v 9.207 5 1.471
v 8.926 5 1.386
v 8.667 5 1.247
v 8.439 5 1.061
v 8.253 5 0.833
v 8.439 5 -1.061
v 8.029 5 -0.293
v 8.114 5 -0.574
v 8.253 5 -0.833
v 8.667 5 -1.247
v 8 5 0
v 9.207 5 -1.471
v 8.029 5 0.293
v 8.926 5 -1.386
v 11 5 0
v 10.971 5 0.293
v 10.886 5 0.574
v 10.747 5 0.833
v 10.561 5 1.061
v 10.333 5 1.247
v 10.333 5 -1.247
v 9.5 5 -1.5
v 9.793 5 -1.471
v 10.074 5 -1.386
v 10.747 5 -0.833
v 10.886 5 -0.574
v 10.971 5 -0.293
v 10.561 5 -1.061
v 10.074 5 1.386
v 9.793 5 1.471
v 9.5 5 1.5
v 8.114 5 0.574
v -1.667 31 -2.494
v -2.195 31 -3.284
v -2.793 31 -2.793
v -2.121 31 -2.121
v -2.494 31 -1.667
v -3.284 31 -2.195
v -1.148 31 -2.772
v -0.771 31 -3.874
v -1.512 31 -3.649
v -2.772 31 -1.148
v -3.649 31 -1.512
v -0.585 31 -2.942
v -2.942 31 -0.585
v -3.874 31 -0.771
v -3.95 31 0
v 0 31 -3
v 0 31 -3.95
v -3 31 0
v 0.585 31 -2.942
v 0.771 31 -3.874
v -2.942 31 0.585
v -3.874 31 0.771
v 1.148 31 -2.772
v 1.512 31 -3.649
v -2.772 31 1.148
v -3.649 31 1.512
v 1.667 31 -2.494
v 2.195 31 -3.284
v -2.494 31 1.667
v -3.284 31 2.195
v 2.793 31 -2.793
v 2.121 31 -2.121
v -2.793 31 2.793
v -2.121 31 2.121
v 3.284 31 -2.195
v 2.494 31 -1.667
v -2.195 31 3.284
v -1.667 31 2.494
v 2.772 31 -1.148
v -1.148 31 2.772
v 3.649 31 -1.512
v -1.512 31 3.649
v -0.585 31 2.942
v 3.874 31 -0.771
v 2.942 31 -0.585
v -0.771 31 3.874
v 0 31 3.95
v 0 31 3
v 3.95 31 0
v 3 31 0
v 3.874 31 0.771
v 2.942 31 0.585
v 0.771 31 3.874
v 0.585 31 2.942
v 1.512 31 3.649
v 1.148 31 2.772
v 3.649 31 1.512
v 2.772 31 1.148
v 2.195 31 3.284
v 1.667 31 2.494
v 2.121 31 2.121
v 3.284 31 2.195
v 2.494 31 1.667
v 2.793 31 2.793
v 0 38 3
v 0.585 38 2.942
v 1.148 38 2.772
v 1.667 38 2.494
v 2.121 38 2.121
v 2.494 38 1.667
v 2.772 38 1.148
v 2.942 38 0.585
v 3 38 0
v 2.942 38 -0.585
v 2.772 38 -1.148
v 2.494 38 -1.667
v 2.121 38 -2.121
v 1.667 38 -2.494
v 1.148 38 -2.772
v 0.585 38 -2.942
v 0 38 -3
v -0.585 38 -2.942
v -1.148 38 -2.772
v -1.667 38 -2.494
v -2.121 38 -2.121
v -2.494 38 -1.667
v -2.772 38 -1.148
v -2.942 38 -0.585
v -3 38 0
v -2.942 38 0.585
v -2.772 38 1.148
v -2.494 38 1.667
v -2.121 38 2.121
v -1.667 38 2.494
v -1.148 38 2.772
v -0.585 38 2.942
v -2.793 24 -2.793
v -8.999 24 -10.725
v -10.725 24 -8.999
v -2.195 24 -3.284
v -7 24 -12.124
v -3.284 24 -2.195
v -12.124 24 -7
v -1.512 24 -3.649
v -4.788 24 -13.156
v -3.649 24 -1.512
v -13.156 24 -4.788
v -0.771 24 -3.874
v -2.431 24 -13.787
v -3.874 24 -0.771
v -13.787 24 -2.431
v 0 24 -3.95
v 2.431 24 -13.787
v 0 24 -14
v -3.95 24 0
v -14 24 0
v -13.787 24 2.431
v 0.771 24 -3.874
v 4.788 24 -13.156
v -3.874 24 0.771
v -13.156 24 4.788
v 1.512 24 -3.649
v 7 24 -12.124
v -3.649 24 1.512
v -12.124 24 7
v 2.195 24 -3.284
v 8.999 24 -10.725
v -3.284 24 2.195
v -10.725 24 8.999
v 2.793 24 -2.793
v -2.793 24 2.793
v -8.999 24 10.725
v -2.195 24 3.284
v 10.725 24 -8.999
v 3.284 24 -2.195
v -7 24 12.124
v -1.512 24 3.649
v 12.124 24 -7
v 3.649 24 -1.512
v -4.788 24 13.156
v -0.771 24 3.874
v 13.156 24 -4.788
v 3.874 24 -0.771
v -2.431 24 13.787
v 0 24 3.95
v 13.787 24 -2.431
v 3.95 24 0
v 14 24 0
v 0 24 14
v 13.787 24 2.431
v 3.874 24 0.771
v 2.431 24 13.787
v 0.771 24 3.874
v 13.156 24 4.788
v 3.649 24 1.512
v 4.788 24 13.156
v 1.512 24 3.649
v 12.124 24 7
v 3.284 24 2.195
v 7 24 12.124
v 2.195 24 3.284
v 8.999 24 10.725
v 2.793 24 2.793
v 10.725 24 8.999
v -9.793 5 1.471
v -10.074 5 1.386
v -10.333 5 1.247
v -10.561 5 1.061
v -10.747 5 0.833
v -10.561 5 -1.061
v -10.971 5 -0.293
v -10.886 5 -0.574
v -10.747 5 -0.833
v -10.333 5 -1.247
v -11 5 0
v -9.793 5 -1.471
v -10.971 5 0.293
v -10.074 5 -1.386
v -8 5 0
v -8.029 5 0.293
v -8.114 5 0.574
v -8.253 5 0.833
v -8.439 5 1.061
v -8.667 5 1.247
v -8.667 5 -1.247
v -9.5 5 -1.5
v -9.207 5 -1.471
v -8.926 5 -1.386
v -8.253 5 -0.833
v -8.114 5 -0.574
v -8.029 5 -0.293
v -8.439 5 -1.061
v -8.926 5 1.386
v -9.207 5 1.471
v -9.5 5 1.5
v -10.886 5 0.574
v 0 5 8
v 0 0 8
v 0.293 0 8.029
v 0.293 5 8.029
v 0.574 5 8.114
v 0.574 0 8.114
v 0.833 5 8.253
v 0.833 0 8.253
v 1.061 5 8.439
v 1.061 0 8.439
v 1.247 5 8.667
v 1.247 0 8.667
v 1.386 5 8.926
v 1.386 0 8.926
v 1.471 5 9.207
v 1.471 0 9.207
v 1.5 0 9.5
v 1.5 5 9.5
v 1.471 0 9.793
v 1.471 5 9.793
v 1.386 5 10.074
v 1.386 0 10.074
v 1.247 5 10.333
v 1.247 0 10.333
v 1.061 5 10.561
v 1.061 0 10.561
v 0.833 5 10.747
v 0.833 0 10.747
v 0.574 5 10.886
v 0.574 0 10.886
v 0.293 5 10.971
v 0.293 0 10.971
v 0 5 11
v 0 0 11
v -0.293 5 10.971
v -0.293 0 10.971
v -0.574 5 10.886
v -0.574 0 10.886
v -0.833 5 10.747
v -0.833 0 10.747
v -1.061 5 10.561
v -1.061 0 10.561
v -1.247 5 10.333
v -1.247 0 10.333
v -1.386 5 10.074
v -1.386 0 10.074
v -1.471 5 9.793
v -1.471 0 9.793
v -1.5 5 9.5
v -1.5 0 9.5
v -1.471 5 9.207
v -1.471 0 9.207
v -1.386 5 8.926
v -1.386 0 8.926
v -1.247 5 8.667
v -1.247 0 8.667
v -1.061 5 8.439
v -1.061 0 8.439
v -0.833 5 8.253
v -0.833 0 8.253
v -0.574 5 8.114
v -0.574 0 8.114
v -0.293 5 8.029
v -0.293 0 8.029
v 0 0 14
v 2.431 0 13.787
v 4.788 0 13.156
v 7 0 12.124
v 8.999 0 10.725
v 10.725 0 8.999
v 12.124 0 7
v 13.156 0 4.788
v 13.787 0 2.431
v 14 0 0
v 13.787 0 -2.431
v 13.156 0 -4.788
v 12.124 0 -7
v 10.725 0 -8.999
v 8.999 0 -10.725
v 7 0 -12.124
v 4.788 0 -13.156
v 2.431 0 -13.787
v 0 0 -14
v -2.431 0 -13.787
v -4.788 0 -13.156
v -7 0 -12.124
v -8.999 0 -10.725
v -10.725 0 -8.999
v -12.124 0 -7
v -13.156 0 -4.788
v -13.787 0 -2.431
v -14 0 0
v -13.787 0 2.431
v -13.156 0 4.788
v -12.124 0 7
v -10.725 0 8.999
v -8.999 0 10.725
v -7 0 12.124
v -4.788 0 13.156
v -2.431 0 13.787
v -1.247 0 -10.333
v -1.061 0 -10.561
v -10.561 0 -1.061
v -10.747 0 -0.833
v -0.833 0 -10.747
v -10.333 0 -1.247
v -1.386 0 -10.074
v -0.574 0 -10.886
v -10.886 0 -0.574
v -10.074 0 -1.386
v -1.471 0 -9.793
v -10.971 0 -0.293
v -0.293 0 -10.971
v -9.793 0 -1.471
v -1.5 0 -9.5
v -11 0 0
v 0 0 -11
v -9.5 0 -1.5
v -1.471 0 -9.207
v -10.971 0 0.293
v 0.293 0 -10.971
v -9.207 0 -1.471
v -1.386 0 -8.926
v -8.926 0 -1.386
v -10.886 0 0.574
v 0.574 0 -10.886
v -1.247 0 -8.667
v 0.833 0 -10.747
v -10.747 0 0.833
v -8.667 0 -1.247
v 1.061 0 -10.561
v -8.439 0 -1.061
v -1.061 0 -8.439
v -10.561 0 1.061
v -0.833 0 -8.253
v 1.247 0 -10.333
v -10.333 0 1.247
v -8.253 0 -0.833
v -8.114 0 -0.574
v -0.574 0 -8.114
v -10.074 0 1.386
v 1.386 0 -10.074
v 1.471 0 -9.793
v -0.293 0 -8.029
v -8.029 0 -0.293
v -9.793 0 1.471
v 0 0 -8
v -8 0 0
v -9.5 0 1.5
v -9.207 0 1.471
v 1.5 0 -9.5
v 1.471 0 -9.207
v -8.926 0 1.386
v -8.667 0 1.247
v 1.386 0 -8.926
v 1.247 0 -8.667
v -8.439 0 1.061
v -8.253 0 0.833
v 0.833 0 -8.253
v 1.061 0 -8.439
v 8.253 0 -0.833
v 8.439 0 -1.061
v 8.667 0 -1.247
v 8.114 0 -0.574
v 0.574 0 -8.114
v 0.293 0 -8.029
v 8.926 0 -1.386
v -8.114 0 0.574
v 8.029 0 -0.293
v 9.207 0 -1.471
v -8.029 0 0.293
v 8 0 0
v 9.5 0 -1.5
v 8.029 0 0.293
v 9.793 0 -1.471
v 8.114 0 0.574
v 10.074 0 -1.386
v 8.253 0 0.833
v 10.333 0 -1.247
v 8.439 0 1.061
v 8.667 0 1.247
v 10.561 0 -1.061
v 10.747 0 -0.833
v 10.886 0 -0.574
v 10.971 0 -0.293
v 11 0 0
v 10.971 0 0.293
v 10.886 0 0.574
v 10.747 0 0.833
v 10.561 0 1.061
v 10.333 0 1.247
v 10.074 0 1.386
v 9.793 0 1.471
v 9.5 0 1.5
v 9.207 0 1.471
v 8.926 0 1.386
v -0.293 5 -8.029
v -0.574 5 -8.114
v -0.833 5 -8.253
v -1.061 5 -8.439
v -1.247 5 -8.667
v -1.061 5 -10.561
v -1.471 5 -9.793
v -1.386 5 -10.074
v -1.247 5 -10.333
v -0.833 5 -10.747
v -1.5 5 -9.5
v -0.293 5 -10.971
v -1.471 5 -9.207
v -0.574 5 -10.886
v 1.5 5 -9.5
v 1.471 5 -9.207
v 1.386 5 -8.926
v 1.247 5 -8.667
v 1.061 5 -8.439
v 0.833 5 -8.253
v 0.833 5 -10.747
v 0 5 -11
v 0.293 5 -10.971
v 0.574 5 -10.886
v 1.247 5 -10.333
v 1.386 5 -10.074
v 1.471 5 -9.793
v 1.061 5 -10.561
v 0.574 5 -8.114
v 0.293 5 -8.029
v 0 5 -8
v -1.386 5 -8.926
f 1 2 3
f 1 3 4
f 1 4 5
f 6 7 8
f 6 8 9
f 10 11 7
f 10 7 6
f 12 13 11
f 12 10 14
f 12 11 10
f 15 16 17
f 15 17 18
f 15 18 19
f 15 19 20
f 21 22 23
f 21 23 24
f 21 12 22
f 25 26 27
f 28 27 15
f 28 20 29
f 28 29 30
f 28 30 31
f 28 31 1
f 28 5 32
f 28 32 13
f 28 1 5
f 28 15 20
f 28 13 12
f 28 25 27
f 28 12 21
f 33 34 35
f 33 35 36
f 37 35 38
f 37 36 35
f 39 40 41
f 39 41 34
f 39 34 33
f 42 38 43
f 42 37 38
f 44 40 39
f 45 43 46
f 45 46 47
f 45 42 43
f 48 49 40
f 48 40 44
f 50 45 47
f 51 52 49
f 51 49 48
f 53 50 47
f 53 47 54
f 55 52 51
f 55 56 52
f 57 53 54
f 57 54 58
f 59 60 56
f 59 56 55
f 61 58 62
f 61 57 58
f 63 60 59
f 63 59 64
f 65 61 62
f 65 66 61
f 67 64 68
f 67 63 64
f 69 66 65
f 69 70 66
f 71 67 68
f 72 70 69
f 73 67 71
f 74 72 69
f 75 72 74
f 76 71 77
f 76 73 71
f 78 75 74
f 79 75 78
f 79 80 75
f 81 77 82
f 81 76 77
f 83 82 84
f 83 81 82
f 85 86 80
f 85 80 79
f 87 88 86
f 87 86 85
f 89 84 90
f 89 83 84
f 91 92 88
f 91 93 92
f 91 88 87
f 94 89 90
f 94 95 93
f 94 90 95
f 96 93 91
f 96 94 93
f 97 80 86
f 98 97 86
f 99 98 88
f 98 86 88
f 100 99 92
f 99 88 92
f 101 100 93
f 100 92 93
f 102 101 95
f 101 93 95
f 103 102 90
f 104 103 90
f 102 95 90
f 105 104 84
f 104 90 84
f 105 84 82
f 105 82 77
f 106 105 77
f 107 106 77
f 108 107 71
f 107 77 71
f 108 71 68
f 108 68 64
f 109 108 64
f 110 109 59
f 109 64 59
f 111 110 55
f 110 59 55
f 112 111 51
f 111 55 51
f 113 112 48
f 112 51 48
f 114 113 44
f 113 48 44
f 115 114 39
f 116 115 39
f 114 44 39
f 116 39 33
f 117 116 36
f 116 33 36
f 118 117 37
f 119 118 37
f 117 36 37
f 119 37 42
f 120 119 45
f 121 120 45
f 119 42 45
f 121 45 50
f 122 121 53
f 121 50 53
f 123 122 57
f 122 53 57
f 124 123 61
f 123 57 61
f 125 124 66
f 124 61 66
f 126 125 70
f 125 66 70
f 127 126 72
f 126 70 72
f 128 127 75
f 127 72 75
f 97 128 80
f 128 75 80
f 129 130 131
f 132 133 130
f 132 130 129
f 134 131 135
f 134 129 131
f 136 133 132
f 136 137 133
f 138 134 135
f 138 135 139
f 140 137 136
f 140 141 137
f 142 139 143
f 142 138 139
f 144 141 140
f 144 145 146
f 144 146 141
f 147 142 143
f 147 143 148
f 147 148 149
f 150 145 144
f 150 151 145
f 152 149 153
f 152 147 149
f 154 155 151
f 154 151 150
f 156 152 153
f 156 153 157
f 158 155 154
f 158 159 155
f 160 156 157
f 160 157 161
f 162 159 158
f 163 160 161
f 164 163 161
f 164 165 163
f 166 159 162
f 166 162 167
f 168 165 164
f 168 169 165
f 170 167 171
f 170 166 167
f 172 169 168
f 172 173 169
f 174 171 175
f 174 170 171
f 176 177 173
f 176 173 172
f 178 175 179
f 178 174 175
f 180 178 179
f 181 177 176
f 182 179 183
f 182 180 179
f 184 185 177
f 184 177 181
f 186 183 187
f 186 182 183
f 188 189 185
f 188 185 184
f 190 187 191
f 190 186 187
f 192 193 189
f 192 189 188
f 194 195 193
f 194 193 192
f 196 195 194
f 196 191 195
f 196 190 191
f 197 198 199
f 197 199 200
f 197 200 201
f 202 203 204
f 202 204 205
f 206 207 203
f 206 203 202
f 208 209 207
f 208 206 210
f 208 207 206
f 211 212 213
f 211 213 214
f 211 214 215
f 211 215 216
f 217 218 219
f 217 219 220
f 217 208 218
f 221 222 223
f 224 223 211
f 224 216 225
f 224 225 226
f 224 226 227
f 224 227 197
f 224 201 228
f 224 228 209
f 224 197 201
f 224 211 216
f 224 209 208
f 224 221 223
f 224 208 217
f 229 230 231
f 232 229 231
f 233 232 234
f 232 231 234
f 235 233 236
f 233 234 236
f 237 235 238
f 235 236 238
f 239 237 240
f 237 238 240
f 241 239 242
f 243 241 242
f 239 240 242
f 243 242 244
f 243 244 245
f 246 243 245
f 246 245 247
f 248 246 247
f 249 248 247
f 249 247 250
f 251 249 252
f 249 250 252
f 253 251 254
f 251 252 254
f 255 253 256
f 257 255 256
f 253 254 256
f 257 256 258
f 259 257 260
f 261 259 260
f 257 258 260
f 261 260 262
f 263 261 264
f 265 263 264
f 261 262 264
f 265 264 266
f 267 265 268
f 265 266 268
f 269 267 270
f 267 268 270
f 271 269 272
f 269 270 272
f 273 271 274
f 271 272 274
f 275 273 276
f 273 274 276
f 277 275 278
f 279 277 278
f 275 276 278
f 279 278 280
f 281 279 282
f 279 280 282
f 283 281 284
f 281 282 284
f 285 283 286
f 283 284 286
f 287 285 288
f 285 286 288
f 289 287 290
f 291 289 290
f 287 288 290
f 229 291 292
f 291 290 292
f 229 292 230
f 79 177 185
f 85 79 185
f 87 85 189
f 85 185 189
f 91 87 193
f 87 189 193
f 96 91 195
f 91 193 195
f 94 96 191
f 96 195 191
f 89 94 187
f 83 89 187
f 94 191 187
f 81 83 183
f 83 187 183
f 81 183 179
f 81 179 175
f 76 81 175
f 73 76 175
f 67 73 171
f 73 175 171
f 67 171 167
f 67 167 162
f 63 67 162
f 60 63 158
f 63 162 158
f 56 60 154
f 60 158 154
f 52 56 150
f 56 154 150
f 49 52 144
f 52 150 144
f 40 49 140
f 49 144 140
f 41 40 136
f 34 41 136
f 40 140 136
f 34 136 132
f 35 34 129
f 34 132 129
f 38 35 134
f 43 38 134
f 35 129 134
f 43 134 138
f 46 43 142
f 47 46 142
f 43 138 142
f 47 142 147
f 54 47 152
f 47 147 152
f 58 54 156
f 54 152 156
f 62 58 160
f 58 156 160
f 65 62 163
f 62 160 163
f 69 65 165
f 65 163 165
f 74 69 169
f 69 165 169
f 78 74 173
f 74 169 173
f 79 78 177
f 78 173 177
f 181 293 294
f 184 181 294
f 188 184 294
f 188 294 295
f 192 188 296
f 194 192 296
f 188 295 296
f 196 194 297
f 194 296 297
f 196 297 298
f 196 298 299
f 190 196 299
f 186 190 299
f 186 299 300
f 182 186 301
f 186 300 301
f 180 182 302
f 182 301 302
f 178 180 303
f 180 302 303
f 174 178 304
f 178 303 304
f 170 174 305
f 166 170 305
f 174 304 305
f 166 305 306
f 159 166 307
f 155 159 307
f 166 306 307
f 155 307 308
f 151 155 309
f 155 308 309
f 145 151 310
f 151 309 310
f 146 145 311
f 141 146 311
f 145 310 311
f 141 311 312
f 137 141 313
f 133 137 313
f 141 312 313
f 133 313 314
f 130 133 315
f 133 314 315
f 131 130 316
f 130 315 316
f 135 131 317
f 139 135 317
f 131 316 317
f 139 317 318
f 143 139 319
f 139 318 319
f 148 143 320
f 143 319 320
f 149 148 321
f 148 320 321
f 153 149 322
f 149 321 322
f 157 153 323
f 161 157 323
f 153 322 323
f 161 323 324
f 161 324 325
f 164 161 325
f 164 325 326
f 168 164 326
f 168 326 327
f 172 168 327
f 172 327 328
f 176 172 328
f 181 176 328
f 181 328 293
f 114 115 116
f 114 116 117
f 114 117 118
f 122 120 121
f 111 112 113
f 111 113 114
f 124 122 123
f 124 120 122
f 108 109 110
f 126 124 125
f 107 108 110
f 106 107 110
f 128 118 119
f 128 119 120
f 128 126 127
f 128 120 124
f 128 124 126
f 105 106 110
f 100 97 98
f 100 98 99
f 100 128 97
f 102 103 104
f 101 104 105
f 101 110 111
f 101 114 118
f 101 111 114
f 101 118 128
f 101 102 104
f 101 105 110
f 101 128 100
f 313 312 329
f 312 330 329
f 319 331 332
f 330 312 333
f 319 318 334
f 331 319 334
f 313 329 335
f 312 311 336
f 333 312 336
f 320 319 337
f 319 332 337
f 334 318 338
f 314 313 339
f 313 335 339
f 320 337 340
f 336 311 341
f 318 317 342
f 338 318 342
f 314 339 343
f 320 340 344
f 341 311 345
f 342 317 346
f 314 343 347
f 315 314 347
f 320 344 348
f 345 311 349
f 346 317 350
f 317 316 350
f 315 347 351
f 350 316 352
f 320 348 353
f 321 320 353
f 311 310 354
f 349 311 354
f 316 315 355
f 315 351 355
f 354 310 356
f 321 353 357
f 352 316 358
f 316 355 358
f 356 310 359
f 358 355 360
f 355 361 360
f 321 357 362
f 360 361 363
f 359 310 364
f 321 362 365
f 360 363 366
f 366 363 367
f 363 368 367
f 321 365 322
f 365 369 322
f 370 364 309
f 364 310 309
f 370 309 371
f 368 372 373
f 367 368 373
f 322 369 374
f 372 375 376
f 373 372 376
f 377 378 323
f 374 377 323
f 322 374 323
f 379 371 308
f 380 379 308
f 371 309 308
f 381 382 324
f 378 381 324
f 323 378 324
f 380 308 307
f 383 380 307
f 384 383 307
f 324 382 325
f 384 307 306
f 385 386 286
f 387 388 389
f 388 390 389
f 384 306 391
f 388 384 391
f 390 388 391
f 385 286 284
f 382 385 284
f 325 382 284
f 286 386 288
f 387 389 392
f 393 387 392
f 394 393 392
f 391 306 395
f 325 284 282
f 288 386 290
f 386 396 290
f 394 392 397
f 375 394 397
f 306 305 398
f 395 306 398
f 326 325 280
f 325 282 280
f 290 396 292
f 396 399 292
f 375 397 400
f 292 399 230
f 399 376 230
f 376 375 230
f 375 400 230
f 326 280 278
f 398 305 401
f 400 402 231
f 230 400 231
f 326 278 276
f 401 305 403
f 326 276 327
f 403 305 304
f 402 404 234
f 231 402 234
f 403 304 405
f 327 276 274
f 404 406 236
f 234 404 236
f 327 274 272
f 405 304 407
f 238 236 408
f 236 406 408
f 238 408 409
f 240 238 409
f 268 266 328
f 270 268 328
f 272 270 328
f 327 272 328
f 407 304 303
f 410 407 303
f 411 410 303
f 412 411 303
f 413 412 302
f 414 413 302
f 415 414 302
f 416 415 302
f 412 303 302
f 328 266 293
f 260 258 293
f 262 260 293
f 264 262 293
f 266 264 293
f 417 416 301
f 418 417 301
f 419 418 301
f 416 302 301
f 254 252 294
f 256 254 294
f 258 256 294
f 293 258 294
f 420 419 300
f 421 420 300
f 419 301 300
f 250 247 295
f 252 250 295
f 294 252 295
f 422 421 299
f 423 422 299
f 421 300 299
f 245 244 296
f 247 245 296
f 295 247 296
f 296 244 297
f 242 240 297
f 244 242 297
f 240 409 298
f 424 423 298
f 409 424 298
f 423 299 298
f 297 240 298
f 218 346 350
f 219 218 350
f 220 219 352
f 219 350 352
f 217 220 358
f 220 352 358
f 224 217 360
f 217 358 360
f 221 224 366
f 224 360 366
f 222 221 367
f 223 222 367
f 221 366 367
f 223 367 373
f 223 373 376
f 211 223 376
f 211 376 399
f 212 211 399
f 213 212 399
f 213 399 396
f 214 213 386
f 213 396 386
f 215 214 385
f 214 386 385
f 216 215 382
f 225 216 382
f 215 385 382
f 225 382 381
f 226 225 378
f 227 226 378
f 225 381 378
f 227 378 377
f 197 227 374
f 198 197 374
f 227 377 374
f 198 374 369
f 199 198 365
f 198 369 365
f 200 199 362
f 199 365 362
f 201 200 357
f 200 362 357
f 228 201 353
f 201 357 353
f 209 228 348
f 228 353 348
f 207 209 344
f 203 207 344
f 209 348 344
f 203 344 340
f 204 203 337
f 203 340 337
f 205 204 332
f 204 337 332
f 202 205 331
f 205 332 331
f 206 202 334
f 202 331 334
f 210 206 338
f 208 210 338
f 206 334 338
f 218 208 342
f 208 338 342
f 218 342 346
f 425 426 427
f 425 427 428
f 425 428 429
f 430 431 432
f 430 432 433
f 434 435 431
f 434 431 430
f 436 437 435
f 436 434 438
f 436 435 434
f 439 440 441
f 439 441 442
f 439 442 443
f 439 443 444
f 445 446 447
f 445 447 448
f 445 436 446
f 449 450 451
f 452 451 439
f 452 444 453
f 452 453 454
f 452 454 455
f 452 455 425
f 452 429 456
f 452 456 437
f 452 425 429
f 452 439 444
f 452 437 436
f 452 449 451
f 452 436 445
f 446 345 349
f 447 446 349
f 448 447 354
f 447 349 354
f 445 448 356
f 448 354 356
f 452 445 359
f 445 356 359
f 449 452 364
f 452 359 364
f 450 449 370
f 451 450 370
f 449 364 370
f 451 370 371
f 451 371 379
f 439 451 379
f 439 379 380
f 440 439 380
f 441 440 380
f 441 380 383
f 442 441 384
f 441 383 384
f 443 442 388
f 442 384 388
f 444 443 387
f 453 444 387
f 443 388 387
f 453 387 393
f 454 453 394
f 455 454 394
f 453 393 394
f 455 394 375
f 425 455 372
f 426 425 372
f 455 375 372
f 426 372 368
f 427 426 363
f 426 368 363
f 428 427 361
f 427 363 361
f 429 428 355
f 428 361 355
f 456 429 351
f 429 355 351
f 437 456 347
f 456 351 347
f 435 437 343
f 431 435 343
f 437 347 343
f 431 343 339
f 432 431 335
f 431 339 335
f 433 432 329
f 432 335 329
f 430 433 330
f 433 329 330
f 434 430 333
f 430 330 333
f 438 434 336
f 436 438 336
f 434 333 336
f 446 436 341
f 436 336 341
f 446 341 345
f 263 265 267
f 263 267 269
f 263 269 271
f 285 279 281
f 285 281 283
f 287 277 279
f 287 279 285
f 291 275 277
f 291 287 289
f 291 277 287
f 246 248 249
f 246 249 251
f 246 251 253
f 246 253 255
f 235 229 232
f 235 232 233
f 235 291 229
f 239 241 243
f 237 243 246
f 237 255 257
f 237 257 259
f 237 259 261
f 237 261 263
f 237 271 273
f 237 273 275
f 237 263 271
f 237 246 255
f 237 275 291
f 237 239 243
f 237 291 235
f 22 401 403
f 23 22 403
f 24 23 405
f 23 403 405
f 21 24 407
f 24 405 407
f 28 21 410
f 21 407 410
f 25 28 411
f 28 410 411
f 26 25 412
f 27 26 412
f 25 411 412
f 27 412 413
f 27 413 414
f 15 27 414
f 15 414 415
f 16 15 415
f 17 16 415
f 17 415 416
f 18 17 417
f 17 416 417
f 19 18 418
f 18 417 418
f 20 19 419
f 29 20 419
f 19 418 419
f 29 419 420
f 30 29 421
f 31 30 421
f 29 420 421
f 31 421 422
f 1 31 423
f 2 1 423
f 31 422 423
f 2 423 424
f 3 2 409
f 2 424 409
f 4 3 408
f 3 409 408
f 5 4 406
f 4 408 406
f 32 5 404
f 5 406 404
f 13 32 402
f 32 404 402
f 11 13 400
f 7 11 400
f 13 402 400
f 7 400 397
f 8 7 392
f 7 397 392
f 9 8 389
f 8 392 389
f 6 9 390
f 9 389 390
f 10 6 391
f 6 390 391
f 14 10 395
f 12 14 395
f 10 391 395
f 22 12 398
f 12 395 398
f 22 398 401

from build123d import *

# Parameters (mm, degrees)
SKETCH2_R           = 14
BOSS_EXTRUDE1_DEPTH = 24
SKETCH3_R           = 3.95
BOSS_EXTRUDE2_DEPTH = 7
SKETCH4_R           = 3
BOSS_EXTRUDE3_DEPTH = 7
SKETCH6_R           = 1.5
CUT_EXTRUDE1_DEPTH  = 5


with BuildPart() as part:
    # Sketch2 → Boss-Extrude1 (new body)
    with BuildSketch(Plane(origin=(0, 0, 0), x_dir=(1, 0, 0), z_dir=(0, 1, 0))):
        with Locations(Location((0, 0, 0), (0, 0, 270))):
            Circle(SKETCH2_R)
    extrude(amount=BOSS_EXTRUDE1_DEPTH)

    # Sketch3 → Boss-Extrude2 (add)
    with BuildSketch(Plane(origin=(0, 24, 0), x_dir=(1, 0, 0), z_dir=(0, 1, 0))):
        with Locations(Location((0, 0, 0), (0, 0, 270))):
            Circle(SKETCH3_R)
    extrude(amount=BOSS_EXTRUDE2_DEPTH)

    # Sketch4 → Boss-Extrude3 (add)
    with BuildSketch(Plane(origin=(0, 31, 0), x_dir=(1, 0, 0), z_dir=(0, 1, 0))):
        with Locations(Location((0, 0, 0), (0, 0, 270))):
            Circle(SKETCH4_R)
    extrude(amount=BOSS_EXTRUDE3_DEPTH)

    # Sketch6 → Cut-Extrude1 (cut)
    with BuildSketch(Plane.XZ):
        with Locations(Location((9.5, 0, 0), (0, 0, 270))):
            Circle(SKETCH6_R)
        with Locations(Location((0, -9.5, 0), (0, 0, 270))):
            Circle(SKETCH6_R)
        with Locations(Location((-9.5, 0, 0), (0, 0, 270))):
            Circle(SKETCH6_R)
        with Locations(Location((0, 9.5, 0), (0, 0, 270))):
            Circle(SKETCH6_R)
    extrude(amount=-CUT_EXTRUDE1_DEPTH, mode=Mode.SUBTRACT)


solid = part.part
